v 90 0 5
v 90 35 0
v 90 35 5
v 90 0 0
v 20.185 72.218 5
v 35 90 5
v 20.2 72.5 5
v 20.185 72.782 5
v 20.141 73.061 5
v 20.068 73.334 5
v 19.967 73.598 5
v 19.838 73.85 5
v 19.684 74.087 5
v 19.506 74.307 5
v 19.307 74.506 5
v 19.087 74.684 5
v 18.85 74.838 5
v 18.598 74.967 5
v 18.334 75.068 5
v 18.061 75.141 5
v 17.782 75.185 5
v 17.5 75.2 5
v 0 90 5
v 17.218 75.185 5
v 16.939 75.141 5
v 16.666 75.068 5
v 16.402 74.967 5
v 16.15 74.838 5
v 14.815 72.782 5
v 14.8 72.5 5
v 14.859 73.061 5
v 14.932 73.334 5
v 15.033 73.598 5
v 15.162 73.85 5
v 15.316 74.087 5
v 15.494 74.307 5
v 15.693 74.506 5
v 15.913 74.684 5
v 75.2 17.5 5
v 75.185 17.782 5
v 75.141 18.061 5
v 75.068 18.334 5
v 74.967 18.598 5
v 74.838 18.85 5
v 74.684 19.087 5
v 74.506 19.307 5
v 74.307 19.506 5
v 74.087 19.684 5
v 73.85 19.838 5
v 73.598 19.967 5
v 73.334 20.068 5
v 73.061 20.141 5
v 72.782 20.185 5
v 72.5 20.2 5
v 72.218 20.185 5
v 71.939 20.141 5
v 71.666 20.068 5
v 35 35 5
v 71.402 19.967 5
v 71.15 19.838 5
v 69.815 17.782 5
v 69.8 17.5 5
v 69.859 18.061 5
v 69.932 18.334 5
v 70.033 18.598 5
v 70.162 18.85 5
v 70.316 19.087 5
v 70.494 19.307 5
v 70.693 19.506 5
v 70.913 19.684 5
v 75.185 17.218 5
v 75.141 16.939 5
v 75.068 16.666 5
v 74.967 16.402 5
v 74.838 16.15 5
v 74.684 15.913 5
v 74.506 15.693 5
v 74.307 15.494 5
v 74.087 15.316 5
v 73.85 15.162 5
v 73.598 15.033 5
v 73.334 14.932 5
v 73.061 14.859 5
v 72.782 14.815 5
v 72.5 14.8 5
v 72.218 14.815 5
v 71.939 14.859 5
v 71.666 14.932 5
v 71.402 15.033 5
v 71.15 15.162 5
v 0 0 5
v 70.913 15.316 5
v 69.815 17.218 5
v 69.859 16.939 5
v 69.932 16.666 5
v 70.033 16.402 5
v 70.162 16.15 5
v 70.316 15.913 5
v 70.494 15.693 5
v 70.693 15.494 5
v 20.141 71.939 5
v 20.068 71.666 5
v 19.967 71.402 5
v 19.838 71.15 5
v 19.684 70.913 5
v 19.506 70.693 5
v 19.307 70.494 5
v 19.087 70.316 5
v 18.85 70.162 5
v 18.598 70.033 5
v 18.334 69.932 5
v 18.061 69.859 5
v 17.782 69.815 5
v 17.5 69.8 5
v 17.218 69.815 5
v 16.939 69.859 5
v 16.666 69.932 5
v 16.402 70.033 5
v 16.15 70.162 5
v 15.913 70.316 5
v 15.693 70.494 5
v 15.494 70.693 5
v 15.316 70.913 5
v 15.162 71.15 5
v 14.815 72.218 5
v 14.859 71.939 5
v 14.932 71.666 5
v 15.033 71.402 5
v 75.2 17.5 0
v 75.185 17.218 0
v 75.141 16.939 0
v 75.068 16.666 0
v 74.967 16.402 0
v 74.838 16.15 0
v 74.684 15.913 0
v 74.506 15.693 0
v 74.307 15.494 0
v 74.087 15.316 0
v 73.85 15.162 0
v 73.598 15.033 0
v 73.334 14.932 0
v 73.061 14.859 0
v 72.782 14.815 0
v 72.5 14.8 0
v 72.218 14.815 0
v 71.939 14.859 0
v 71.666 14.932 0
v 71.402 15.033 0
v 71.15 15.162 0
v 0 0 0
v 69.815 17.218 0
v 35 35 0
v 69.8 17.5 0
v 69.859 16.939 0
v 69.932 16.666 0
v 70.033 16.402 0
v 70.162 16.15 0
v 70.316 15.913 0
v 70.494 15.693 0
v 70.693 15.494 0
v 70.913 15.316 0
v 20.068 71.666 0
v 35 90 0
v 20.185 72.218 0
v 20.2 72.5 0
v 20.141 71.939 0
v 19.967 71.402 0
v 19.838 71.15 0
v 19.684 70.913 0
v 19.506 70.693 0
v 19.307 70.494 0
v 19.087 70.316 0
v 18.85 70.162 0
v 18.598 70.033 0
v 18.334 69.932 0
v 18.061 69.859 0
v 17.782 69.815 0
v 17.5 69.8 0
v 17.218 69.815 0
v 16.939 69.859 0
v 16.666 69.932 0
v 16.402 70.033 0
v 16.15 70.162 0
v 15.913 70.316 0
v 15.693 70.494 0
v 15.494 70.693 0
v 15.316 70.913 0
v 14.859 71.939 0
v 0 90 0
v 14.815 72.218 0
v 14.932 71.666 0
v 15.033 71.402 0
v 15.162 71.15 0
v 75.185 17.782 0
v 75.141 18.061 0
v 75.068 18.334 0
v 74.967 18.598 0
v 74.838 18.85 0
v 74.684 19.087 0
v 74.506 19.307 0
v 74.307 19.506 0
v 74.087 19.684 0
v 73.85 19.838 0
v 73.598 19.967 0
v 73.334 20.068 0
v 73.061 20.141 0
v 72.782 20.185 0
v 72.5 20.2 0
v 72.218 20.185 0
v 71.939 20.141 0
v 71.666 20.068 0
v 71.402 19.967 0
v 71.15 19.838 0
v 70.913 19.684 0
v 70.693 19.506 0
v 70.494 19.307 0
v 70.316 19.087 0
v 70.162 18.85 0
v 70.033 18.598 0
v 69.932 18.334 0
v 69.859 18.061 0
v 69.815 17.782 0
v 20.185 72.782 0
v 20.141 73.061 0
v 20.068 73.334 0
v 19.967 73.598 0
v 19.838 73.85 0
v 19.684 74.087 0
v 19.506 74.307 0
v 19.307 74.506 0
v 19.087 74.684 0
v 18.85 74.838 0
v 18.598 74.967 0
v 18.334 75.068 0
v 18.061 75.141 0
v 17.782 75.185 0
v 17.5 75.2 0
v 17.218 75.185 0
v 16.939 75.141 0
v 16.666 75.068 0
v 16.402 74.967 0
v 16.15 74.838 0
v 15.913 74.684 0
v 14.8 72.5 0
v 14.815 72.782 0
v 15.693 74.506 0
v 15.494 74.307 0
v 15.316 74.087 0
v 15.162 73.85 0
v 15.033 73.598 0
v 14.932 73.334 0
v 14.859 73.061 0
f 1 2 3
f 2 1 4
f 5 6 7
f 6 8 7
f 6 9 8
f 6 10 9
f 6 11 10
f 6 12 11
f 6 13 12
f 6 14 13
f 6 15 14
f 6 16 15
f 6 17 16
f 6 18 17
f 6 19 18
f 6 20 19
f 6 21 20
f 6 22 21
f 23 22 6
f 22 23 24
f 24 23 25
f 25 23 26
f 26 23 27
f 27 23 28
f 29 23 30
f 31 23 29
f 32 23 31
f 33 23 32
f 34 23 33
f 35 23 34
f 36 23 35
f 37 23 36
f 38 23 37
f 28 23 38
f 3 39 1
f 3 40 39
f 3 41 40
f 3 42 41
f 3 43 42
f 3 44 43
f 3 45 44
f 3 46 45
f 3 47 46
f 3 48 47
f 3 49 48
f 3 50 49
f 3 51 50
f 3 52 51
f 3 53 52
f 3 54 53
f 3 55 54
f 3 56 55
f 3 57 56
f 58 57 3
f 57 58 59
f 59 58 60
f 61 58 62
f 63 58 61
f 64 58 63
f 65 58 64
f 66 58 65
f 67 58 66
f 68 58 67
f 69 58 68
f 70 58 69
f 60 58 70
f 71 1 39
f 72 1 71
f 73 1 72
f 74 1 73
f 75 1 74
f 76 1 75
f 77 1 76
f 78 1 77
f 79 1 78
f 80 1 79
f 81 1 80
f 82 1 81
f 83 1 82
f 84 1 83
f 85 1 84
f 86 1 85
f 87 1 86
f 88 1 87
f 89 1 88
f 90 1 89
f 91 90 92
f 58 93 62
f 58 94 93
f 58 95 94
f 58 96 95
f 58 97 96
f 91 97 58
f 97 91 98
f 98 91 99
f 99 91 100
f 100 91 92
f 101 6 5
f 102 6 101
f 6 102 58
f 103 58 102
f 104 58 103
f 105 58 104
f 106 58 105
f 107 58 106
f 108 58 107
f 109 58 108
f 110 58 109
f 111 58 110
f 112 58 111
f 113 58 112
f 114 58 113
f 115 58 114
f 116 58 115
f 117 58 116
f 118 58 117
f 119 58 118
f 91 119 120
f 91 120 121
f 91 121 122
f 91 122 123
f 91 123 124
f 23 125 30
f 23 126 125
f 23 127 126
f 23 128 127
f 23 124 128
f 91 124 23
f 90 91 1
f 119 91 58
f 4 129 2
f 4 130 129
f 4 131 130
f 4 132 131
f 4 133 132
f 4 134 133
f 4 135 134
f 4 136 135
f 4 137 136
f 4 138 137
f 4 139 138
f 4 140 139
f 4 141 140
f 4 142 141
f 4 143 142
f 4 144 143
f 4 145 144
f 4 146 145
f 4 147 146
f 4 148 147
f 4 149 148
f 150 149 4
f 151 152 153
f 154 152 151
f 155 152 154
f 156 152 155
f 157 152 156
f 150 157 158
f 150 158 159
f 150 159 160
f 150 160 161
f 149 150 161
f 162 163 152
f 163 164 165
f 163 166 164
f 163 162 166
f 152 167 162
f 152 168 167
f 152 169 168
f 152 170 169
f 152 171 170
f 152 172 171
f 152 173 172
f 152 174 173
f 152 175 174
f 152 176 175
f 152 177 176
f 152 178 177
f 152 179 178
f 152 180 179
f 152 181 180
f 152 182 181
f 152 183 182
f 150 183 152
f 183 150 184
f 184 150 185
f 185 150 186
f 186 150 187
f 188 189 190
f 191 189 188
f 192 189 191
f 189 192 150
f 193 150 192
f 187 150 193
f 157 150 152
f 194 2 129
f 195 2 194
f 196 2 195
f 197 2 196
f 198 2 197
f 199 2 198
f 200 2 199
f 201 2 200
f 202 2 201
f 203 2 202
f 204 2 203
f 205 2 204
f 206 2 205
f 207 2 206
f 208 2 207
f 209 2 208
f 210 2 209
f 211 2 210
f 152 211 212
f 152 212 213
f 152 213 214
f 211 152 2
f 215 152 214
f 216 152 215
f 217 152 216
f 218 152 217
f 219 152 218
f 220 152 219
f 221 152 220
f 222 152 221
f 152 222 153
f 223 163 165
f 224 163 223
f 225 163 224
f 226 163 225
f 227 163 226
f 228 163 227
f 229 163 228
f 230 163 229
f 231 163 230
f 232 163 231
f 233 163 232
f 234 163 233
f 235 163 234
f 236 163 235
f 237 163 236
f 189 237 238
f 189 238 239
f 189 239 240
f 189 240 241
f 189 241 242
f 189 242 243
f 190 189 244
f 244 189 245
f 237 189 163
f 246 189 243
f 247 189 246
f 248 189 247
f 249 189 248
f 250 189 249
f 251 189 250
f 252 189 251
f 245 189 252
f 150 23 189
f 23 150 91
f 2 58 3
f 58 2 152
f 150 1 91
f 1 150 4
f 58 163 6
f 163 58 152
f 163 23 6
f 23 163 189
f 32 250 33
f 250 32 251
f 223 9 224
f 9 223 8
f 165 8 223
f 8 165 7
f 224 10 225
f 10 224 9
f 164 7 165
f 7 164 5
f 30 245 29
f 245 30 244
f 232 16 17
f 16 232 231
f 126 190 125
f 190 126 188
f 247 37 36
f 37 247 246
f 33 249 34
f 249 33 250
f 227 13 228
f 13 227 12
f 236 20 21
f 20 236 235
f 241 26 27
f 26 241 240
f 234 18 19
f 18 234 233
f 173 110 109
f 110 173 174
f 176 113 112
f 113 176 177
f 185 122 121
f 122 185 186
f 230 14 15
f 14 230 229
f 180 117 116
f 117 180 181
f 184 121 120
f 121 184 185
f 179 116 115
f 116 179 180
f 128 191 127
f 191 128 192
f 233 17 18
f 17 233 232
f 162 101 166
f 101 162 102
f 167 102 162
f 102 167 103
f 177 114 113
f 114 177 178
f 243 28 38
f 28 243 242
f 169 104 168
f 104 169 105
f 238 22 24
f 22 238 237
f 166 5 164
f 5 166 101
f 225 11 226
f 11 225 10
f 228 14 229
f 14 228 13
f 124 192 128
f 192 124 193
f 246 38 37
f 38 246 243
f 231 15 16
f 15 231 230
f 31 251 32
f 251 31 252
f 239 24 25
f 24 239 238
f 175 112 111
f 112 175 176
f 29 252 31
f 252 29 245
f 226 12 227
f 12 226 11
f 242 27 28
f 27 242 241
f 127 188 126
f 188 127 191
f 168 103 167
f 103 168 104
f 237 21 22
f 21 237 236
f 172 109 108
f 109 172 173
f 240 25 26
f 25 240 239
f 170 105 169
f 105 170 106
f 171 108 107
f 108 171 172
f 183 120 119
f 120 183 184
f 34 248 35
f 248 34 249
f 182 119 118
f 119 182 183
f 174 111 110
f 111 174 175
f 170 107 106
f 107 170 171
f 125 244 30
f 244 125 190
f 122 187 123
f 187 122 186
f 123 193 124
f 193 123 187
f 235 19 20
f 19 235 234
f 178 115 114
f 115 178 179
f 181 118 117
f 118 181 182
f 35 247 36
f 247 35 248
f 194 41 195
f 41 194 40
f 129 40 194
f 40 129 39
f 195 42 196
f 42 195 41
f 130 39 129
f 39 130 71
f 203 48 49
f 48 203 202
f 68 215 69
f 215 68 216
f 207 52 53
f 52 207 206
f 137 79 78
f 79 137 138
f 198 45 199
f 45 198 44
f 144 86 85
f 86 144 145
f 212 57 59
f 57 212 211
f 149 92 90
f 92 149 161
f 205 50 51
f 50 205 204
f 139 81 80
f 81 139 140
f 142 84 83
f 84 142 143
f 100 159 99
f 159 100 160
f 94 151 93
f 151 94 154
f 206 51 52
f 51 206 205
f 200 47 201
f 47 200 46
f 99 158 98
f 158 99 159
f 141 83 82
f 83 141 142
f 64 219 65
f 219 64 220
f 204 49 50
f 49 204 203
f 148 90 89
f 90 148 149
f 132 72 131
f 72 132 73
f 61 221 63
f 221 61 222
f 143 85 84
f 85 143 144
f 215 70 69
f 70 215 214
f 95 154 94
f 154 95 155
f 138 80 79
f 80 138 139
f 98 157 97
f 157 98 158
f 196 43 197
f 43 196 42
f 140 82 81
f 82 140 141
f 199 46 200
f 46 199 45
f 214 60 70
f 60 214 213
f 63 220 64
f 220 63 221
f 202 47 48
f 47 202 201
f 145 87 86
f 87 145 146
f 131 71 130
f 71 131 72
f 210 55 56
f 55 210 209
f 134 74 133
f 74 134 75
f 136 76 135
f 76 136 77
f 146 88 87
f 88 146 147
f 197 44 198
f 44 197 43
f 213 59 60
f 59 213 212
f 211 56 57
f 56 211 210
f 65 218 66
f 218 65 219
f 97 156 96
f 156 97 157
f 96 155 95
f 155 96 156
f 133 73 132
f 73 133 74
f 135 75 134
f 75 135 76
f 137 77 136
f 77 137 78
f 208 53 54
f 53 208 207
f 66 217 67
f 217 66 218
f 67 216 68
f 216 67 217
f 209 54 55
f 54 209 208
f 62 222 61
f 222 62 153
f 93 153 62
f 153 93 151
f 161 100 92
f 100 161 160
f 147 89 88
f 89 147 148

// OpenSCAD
// Flat 90-degree corner plate.
$fn = 60;
eps = 0.02;
arm = 90;
width = 35;
plate_t = 5;
difference() {
    union() { cube([arm, width, plate_t]); cube([width, arm, plate_t]); }
    for (p = [[width / 2, arm - width / 2], [arm - width / 2, width / 2]])
        translate([p[0], p[1], -eps]) cylinder(d = 5.4, h = plate_t + 2 * eps);
}
